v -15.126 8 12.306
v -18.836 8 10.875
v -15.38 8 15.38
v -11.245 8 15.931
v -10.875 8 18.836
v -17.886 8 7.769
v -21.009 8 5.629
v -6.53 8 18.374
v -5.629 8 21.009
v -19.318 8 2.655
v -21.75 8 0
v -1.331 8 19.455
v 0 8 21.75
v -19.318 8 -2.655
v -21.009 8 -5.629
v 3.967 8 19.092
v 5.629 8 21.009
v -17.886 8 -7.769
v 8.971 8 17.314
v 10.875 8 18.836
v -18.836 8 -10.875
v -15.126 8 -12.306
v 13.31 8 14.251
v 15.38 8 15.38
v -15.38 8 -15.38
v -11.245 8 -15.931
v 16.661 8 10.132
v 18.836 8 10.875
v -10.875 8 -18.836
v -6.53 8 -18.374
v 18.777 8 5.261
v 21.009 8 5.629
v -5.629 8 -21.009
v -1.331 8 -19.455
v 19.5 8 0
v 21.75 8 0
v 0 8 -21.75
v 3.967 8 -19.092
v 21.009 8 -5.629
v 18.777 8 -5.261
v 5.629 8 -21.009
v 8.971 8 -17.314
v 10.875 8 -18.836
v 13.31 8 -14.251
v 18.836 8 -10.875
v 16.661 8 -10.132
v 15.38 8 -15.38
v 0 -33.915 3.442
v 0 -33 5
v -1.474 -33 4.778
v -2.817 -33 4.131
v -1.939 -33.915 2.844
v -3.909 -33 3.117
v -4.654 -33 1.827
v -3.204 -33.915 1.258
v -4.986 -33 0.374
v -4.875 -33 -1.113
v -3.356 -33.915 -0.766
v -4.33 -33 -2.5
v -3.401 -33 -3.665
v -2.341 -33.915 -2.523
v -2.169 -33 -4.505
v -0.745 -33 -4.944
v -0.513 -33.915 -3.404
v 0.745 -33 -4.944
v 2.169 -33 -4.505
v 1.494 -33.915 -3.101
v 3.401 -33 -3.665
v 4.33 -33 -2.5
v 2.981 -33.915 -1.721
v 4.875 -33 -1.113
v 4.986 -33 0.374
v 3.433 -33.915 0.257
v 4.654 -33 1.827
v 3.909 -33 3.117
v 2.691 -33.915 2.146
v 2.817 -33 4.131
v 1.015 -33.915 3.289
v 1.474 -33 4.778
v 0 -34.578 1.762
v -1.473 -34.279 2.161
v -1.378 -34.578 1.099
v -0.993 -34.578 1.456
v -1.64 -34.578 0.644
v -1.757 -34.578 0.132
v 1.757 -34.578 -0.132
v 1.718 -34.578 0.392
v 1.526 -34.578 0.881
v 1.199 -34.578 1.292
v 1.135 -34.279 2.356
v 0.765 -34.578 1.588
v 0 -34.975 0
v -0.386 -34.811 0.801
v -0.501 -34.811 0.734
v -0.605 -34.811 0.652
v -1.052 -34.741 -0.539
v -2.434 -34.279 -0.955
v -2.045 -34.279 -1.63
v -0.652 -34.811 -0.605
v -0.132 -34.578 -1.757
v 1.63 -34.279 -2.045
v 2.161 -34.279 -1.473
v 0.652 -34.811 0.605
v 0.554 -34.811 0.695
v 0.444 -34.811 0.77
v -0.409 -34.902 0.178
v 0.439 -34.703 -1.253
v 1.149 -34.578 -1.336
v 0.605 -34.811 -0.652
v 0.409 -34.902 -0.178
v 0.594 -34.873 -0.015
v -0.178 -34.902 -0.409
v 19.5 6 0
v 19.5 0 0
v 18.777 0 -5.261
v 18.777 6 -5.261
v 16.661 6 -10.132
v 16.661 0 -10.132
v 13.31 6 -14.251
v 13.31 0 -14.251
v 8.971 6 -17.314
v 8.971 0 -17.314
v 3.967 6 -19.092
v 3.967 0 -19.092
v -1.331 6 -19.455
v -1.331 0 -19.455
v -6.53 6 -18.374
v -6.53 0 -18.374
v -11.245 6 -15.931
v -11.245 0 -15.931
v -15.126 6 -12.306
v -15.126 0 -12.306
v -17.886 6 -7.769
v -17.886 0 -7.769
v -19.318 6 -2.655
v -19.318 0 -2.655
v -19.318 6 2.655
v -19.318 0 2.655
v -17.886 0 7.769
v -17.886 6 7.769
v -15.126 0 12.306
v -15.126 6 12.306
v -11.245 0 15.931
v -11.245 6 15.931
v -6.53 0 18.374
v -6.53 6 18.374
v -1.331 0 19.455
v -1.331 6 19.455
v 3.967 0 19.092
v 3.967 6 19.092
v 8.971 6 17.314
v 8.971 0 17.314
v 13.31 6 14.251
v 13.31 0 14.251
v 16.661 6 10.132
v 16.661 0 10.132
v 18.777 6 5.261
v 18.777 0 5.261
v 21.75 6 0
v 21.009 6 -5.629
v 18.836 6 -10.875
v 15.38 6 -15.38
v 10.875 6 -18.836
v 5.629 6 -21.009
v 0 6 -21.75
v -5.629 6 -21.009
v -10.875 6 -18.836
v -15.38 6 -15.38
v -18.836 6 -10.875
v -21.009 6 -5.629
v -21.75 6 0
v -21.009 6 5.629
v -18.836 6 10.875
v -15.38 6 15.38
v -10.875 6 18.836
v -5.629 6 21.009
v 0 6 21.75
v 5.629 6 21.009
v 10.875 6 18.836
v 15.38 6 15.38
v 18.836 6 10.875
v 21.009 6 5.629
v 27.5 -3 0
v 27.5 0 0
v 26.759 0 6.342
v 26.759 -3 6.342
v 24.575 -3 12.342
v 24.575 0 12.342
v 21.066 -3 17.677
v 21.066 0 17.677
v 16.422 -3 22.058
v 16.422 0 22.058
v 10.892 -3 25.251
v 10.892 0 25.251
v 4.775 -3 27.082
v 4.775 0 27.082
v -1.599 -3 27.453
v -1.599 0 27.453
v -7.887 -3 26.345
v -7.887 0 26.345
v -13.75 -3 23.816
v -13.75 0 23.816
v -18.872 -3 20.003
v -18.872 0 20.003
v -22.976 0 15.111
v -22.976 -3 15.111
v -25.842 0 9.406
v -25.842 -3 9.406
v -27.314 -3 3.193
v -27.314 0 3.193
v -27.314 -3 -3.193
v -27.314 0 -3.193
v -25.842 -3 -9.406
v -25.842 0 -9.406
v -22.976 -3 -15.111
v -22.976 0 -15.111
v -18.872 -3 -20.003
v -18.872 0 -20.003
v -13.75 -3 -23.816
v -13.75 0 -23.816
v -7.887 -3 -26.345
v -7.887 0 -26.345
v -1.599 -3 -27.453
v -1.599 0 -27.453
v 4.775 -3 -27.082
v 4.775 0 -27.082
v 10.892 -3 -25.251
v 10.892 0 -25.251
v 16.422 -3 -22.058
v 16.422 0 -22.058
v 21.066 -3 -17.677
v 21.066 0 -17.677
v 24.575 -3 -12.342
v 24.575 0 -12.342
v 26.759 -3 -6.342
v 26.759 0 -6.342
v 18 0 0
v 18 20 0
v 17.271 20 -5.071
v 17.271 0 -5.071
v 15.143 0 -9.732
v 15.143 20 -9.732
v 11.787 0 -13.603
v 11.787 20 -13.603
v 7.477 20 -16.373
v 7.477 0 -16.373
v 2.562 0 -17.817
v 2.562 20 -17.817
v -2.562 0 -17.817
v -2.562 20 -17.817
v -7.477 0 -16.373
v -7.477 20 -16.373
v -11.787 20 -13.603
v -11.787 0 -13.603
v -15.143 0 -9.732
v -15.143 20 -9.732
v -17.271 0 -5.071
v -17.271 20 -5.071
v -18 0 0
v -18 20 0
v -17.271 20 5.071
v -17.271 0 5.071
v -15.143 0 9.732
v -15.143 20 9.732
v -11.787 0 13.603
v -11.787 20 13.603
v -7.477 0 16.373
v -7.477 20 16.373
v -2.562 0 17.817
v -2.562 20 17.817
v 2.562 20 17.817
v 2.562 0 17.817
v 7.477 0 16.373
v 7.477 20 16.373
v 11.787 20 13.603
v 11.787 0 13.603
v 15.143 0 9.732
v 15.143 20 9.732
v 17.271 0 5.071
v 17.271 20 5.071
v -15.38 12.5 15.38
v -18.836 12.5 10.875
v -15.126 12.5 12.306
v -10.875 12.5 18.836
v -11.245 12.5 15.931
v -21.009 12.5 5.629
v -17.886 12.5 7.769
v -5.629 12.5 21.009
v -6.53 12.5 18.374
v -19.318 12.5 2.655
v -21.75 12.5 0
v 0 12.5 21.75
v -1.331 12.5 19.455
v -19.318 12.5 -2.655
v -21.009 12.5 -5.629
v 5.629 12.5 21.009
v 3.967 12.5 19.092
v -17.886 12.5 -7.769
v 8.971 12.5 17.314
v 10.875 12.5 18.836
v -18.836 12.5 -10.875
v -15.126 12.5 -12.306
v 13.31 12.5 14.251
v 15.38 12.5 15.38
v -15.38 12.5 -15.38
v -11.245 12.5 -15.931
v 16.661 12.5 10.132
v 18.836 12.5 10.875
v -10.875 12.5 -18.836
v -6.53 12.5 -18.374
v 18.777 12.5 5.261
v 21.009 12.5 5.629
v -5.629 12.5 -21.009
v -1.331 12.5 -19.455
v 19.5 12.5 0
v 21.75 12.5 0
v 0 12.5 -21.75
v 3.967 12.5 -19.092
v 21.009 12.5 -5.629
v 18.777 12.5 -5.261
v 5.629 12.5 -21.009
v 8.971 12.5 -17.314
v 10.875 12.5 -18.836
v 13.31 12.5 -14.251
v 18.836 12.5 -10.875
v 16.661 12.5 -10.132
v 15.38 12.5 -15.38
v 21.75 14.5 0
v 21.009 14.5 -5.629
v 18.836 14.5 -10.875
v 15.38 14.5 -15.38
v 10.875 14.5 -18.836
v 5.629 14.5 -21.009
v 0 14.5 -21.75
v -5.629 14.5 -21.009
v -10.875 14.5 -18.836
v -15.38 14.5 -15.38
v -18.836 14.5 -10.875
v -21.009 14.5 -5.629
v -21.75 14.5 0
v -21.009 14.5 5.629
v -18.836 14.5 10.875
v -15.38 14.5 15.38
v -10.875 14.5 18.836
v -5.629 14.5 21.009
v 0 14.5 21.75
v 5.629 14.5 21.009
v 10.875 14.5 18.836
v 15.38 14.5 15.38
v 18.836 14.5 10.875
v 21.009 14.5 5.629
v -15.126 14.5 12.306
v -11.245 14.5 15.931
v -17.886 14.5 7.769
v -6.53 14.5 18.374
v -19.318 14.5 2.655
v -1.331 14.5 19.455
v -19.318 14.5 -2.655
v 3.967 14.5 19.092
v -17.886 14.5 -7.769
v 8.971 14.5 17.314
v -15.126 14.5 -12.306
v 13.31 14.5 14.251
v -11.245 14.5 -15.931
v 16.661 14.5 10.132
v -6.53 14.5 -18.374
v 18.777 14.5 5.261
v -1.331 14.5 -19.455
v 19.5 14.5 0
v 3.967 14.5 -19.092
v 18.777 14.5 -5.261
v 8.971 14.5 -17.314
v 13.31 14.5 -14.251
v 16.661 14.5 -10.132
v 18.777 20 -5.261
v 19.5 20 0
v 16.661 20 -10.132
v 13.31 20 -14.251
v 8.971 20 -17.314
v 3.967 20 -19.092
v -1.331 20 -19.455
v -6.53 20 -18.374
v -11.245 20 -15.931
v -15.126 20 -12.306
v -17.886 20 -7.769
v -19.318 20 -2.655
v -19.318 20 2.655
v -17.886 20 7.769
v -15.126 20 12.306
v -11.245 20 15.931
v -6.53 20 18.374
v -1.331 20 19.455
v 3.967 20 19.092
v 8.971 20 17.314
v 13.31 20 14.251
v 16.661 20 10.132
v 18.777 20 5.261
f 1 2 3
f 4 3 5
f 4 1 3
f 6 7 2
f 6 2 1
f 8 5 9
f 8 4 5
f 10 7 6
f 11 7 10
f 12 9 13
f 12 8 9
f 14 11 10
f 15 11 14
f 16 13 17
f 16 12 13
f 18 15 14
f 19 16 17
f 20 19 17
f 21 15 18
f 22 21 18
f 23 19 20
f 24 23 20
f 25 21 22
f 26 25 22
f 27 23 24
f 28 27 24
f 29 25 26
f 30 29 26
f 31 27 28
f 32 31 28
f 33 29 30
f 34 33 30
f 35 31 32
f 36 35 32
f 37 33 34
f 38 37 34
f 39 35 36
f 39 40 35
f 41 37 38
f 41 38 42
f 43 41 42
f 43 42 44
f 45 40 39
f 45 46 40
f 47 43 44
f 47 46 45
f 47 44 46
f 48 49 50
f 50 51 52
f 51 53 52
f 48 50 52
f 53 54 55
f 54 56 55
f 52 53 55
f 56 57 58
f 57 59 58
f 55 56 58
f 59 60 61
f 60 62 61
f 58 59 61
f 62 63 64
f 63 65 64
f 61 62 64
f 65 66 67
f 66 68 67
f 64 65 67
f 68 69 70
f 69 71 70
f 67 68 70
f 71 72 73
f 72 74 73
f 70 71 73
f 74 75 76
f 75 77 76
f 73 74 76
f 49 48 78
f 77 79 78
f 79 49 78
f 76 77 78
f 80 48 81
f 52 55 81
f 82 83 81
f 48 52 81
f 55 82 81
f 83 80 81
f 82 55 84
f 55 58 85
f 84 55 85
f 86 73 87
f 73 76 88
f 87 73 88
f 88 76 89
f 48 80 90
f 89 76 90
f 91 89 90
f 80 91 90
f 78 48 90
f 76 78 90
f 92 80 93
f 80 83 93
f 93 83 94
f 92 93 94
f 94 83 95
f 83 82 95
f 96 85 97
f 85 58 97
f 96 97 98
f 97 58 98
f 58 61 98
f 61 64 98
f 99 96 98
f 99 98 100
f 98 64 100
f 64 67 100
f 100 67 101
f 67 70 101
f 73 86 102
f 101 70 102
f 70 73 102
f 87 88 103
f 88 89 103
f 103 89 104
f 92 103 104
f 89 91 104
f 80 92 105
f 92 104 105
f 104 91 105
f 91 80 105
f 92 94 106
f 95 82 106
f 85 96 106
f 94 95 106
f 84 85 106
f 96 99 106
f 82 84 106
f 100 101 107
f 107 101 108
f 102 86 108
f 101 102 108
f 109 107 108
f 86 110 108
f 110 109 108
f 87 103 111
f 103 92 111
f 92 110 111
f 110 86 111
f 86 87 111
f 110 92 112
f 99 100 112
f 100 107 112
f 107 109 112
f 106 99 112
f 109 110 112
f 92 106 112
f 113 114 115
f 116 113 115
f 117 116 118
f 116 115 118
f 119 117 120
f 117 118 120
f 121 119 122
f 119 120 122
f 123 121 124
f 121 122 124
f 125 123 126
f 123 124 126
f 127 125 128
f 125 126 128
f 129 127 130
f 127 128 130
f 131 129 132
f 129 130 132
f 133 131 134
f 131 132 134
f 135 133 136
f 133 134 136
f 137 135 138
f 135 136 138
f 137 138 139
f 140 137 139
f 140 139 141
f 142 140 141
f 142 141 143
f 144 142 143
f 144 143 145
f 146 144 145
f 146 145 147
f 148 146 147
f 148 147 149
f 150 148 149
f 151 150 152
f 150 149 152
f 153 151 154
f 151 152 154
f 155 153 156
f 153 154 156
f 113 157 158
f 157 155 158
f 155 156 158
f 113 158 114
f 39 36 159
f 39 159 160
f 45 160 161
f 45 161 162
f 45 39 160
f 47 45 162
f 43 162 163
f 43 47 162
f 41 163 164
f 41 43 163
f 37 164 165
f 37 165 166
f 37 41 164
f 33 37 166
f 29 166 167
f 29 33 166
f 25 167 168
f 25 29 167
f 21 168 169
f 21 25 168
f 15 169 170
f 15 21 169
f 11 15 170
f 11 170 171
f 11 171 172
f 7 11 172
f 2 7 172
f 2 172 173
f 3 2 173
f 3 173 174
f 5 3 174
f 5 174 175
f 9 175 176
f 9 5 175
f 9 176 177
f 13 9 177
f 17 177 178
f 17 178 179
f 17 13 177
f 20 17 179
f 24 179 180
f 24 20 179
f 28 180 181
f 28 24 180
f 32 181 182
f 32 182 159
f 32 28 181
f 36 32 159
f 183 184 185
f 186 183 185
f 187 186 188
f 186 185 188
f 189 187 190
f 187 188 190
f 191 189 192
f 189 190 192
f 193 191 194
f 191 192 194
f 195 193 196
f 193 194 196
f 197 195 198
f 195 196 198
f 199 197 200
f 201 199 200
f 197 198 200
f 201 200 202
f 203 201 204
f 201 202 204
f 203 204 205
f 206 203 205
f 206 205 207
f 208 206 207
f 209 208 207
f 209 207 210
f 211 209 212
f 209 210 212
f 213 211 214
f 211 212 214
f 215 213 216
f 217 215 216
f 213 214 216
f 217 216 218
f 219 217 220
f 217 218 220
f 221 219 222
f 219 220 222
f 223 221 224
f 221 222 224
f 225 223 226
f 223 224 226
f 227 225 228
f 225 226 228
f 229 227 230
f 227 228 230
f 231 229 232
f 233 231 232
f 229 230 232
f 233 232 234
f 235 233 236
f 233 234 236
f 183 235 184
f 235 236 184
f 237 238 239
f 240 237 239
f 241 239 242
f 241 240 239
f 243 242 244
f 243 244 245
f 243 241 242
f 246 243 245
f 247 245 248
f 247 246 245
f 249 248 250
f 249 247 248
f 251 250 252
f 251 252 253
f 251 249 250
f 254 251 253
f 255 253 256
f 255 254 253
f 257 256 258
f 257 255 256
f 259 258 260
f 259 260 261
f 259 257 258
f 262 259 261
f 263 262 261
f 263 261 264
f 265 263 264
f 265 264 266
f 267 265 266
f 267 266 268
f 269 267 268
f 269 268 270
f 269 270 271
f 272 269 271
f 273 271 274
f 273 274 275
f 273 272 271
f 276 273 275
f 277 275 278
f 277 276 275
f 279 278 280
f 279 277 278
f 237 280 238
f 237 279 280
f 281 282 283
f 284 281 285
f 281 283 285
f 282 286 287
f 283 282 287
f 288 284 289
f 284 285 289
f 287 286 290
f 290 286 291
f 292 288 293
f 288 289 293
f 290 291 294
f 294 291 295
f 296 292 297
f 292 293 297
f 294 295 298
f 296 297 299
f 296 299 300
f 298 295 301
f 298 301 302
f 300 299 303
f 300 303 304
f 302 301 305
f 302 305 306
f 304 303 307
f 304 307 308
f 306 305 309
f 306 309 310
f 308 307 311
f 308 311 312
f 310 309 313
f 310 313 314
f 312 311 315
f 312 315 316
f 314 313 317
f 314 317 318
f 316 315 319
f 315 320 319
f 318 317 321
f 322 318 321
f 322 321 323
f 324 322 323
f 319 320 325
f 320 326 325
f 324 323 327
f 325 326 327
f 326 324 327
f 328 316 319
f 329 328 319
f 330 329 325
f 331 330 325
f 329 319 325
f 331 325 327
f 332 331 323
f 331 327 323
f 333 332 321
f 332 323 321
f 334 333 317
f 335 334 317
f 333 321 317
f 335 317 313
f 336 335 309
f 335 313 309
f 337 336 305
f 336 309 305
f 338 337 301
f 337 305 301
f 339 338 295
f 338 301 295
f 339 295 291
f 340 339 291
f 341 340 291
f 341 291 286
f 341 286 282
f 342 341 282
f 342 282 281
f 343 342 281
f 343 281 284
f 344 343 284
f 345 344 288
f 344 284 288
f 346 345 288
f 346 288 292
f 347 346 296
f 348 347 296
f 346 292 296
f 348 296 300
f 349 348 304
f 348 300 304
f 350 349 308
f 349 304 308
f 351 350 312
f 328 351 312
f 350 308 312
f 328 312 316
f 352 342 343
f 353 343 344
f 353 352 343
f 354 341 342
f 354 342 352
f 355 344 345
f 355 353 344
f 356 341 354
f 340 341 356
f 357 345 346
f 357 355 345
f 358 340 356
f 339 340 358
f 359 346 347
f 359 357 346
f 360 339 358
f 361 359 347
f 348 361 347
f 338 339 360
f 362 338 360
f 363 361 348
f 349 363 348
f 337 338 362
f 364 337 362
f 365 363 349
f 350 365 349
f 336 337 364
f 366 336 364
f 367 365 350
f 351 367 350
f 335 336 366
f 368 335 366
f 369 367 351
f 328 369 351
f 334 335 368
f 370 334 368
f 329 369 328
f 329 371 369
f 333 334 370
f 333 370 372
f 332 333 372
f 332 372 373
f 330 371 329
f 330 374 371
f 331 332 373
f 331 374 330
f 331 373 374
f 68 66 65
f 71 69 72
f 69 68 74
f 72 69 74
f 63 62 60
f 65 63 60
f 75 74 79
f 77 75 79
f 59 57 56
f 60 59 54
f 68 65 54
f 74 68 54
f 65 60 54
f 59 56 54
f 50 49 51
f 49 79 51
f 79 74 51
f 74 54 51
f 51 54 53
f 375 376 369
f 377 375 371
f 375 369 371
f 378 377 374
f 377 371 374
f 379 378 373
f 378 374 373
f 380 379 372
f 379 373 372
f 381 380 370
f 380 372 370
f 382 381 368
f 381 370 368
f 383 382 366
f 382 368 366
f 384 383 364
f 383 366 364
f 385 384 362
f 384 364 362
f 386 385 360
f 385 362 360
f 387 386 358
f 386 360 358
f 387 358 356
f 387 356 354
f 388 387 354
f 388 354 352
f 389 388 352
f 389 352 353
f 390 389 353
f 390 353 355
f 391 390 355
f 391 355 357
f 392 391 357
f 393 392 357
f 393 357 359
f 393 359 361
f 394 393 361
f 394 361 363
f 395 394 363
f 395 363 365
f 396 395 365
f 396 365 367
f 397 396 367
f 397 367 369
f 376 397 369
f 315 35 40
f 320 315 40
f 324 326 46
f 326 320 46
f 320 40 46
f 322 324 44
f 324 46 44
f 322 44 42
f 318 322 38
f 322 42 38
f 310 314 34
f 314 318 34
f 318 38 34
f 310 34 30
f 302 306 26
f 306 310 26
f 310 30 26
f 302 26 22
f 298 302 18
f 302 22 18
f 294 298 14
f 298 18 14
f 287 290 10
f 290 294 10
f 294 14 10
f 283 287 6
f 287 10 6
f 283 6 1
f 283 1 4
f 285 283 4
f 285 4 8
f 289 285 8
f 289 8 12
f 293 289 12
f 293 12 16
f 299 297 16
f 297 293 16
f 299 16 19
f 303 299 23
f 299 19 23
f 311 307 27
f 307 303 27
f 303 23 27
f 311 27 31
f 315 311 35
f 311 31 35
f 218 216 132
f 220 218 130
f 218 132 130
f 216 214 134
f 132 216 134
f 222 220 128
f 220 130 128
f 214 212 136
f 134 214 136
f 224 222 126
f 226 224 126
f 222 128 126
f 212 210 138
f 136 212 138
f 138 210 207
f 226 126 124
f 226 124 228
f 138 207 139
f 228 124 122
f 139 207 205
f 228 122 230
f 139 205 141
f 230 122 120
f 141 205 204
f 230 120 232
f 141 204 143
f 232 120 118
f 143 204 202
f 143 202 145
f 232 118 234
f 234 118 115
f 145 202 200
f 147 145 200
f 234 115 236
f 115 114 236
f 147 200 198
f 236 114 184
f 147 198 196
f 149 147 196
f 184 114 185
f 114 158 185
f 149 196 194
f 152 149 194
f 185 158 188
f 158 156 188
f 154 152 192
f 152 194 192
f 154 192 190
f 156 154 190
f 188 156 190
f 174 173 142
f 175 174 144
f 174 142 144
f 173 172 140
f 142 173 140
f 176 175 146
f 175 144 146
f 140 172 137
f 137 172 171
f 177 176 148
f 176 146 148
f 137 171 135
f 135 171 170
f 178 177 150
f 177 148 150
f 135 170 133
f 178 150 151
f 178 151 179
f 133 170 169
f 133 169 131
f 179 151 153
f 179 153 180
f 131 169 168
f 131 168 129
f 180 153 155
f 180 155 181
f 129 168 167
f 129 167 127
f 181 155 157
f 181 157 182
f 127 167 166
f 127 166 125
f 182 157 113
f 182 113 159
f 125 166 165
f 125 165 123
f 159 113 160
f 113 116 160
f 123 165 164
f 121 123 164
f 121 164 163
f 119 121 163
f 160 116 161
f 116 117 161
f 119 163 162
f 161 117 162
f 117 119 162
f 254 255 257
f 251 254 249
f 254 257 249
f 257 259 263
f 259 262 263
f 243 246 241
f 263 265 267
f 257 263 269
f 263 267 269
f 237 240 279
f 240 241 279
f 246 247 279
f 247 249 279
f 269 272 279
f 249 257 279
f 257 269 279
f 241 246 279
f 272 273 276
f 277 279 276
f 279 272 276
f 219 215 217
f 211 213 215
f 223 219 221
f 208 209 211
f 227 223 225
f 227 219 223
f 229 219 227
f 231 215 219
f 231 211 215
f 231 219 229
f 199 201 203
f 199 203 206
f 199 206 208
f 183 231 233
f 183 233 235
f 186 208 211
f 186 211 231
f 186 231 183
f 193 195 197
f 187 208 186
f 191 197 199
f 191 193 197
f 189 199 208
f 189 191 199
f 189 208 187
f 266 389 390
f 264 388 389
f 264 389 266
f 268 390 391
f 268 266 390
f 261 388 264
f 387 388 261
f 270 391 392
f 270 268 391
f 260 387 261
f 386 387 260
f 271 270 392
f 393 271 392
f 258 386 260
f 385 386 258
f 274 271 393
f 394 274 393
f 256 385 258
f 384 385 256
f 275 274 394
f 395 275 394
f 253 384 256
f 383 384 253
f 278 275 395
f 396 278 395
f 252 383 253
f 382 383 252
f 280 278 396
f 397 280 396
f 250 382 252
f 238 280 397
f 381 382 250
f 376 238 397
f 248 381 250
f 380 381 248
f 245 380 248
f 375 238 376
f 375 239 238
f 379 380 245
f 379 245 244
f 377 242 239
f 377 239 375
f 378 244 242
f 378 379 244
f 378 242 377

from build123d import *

# Parameters (mm, degrees)
SKETCH_1_R          = 19.5
SKETCH_1_R_2        = 18
EXTRUDE_1_DEPTH     = 20
SKETCH_3_R          = 27.5
EXTRUDE_2_DEPTH     = 3
SKETCH_4_R          = 21.75
EXTRUDE_3_DEPTH     = 2
EXTRUDE_START       = 1
SKETCH_8_R          = 21.75
EXTRUDE_4_DEPTH     = 2
SKETCH_6_R          = 18
CUT_EXTRUDE_1_DEPTH = 35


with BuildPart() as part:
    # 草圖1 → 填料-伸長1 (new body)
    with BuildSketch(Plane(origin=(0, 0, 0), x_dir=(1, 0, 0), z_dir=(0, 1, 0))):
        Circle(SKETCH_1_R)
        Circle(SKETCH_1_R_2, mode=Mode.SUBTRACT)
    extrude(amount=EXTRUDE_1_DEPTH)

    # 草圖3 → 填料-伸長2 (add)
    with BuildSketch(Plane.XZ):
        Circle(SKETCH_3_R)
    extrude(amount=EXTRUDE_2_DEPTH)

    # 草圖4 → 填料-伸長3 (add)
    with BuildSketch(Plane(origin=(0, 8, 0), x_dir=(1, 0, 0), z_dir=(0, 1, 0))):
        Circle(SKETCH_4_R)
    extrude(amount=-EXTRUDE_3_DEPTH)

    # 草圖8 → 填料-伸長4 (add)
    with BuildSketch(Plane(origin=(0, 11.5, 0), x_dir=(1, 0, 0), z_dir=(0, 1, 0)).offset(EXTRUDE_START)):
        Circle(SKETCH_8_R)
    extrude(amount=EXTRUDE_4_DEPTH)

    # 草圖6 → 除料-伸長1 (cut)
    with BuildSketch(Plane(origin=(0, 0, 0), x_dir=(1, 0, 0), z_dir=(0, 1, 0))):
        Circle(SKETCH_6_R)
    extrude(amount=CUT_EXTRUDE_1_DEPTH, mode=Mode.SUBTRACT)


with BuildPart() as body_2:
    # 草圖15 → 旋轉10 (revolve)
    with BuildSketch(Plane(origin=(0, 0, 0), x_dir=(0, 0, -1), z_dir=(1, 0, 0))):
        with BuildLine():
            Line((-5, -33), (0, -33))
            Line((0, -33), (0, -34.975323557))
            ThreePointArc((0, -34.975323557), (-2.615059839, -34.278904796), (-5, -33))
        make_face()
    revolve(axis=Axis((0, -27.321248383, 0), (0, -1, 0)))


solid = Compound([part.part, body_2.part])
